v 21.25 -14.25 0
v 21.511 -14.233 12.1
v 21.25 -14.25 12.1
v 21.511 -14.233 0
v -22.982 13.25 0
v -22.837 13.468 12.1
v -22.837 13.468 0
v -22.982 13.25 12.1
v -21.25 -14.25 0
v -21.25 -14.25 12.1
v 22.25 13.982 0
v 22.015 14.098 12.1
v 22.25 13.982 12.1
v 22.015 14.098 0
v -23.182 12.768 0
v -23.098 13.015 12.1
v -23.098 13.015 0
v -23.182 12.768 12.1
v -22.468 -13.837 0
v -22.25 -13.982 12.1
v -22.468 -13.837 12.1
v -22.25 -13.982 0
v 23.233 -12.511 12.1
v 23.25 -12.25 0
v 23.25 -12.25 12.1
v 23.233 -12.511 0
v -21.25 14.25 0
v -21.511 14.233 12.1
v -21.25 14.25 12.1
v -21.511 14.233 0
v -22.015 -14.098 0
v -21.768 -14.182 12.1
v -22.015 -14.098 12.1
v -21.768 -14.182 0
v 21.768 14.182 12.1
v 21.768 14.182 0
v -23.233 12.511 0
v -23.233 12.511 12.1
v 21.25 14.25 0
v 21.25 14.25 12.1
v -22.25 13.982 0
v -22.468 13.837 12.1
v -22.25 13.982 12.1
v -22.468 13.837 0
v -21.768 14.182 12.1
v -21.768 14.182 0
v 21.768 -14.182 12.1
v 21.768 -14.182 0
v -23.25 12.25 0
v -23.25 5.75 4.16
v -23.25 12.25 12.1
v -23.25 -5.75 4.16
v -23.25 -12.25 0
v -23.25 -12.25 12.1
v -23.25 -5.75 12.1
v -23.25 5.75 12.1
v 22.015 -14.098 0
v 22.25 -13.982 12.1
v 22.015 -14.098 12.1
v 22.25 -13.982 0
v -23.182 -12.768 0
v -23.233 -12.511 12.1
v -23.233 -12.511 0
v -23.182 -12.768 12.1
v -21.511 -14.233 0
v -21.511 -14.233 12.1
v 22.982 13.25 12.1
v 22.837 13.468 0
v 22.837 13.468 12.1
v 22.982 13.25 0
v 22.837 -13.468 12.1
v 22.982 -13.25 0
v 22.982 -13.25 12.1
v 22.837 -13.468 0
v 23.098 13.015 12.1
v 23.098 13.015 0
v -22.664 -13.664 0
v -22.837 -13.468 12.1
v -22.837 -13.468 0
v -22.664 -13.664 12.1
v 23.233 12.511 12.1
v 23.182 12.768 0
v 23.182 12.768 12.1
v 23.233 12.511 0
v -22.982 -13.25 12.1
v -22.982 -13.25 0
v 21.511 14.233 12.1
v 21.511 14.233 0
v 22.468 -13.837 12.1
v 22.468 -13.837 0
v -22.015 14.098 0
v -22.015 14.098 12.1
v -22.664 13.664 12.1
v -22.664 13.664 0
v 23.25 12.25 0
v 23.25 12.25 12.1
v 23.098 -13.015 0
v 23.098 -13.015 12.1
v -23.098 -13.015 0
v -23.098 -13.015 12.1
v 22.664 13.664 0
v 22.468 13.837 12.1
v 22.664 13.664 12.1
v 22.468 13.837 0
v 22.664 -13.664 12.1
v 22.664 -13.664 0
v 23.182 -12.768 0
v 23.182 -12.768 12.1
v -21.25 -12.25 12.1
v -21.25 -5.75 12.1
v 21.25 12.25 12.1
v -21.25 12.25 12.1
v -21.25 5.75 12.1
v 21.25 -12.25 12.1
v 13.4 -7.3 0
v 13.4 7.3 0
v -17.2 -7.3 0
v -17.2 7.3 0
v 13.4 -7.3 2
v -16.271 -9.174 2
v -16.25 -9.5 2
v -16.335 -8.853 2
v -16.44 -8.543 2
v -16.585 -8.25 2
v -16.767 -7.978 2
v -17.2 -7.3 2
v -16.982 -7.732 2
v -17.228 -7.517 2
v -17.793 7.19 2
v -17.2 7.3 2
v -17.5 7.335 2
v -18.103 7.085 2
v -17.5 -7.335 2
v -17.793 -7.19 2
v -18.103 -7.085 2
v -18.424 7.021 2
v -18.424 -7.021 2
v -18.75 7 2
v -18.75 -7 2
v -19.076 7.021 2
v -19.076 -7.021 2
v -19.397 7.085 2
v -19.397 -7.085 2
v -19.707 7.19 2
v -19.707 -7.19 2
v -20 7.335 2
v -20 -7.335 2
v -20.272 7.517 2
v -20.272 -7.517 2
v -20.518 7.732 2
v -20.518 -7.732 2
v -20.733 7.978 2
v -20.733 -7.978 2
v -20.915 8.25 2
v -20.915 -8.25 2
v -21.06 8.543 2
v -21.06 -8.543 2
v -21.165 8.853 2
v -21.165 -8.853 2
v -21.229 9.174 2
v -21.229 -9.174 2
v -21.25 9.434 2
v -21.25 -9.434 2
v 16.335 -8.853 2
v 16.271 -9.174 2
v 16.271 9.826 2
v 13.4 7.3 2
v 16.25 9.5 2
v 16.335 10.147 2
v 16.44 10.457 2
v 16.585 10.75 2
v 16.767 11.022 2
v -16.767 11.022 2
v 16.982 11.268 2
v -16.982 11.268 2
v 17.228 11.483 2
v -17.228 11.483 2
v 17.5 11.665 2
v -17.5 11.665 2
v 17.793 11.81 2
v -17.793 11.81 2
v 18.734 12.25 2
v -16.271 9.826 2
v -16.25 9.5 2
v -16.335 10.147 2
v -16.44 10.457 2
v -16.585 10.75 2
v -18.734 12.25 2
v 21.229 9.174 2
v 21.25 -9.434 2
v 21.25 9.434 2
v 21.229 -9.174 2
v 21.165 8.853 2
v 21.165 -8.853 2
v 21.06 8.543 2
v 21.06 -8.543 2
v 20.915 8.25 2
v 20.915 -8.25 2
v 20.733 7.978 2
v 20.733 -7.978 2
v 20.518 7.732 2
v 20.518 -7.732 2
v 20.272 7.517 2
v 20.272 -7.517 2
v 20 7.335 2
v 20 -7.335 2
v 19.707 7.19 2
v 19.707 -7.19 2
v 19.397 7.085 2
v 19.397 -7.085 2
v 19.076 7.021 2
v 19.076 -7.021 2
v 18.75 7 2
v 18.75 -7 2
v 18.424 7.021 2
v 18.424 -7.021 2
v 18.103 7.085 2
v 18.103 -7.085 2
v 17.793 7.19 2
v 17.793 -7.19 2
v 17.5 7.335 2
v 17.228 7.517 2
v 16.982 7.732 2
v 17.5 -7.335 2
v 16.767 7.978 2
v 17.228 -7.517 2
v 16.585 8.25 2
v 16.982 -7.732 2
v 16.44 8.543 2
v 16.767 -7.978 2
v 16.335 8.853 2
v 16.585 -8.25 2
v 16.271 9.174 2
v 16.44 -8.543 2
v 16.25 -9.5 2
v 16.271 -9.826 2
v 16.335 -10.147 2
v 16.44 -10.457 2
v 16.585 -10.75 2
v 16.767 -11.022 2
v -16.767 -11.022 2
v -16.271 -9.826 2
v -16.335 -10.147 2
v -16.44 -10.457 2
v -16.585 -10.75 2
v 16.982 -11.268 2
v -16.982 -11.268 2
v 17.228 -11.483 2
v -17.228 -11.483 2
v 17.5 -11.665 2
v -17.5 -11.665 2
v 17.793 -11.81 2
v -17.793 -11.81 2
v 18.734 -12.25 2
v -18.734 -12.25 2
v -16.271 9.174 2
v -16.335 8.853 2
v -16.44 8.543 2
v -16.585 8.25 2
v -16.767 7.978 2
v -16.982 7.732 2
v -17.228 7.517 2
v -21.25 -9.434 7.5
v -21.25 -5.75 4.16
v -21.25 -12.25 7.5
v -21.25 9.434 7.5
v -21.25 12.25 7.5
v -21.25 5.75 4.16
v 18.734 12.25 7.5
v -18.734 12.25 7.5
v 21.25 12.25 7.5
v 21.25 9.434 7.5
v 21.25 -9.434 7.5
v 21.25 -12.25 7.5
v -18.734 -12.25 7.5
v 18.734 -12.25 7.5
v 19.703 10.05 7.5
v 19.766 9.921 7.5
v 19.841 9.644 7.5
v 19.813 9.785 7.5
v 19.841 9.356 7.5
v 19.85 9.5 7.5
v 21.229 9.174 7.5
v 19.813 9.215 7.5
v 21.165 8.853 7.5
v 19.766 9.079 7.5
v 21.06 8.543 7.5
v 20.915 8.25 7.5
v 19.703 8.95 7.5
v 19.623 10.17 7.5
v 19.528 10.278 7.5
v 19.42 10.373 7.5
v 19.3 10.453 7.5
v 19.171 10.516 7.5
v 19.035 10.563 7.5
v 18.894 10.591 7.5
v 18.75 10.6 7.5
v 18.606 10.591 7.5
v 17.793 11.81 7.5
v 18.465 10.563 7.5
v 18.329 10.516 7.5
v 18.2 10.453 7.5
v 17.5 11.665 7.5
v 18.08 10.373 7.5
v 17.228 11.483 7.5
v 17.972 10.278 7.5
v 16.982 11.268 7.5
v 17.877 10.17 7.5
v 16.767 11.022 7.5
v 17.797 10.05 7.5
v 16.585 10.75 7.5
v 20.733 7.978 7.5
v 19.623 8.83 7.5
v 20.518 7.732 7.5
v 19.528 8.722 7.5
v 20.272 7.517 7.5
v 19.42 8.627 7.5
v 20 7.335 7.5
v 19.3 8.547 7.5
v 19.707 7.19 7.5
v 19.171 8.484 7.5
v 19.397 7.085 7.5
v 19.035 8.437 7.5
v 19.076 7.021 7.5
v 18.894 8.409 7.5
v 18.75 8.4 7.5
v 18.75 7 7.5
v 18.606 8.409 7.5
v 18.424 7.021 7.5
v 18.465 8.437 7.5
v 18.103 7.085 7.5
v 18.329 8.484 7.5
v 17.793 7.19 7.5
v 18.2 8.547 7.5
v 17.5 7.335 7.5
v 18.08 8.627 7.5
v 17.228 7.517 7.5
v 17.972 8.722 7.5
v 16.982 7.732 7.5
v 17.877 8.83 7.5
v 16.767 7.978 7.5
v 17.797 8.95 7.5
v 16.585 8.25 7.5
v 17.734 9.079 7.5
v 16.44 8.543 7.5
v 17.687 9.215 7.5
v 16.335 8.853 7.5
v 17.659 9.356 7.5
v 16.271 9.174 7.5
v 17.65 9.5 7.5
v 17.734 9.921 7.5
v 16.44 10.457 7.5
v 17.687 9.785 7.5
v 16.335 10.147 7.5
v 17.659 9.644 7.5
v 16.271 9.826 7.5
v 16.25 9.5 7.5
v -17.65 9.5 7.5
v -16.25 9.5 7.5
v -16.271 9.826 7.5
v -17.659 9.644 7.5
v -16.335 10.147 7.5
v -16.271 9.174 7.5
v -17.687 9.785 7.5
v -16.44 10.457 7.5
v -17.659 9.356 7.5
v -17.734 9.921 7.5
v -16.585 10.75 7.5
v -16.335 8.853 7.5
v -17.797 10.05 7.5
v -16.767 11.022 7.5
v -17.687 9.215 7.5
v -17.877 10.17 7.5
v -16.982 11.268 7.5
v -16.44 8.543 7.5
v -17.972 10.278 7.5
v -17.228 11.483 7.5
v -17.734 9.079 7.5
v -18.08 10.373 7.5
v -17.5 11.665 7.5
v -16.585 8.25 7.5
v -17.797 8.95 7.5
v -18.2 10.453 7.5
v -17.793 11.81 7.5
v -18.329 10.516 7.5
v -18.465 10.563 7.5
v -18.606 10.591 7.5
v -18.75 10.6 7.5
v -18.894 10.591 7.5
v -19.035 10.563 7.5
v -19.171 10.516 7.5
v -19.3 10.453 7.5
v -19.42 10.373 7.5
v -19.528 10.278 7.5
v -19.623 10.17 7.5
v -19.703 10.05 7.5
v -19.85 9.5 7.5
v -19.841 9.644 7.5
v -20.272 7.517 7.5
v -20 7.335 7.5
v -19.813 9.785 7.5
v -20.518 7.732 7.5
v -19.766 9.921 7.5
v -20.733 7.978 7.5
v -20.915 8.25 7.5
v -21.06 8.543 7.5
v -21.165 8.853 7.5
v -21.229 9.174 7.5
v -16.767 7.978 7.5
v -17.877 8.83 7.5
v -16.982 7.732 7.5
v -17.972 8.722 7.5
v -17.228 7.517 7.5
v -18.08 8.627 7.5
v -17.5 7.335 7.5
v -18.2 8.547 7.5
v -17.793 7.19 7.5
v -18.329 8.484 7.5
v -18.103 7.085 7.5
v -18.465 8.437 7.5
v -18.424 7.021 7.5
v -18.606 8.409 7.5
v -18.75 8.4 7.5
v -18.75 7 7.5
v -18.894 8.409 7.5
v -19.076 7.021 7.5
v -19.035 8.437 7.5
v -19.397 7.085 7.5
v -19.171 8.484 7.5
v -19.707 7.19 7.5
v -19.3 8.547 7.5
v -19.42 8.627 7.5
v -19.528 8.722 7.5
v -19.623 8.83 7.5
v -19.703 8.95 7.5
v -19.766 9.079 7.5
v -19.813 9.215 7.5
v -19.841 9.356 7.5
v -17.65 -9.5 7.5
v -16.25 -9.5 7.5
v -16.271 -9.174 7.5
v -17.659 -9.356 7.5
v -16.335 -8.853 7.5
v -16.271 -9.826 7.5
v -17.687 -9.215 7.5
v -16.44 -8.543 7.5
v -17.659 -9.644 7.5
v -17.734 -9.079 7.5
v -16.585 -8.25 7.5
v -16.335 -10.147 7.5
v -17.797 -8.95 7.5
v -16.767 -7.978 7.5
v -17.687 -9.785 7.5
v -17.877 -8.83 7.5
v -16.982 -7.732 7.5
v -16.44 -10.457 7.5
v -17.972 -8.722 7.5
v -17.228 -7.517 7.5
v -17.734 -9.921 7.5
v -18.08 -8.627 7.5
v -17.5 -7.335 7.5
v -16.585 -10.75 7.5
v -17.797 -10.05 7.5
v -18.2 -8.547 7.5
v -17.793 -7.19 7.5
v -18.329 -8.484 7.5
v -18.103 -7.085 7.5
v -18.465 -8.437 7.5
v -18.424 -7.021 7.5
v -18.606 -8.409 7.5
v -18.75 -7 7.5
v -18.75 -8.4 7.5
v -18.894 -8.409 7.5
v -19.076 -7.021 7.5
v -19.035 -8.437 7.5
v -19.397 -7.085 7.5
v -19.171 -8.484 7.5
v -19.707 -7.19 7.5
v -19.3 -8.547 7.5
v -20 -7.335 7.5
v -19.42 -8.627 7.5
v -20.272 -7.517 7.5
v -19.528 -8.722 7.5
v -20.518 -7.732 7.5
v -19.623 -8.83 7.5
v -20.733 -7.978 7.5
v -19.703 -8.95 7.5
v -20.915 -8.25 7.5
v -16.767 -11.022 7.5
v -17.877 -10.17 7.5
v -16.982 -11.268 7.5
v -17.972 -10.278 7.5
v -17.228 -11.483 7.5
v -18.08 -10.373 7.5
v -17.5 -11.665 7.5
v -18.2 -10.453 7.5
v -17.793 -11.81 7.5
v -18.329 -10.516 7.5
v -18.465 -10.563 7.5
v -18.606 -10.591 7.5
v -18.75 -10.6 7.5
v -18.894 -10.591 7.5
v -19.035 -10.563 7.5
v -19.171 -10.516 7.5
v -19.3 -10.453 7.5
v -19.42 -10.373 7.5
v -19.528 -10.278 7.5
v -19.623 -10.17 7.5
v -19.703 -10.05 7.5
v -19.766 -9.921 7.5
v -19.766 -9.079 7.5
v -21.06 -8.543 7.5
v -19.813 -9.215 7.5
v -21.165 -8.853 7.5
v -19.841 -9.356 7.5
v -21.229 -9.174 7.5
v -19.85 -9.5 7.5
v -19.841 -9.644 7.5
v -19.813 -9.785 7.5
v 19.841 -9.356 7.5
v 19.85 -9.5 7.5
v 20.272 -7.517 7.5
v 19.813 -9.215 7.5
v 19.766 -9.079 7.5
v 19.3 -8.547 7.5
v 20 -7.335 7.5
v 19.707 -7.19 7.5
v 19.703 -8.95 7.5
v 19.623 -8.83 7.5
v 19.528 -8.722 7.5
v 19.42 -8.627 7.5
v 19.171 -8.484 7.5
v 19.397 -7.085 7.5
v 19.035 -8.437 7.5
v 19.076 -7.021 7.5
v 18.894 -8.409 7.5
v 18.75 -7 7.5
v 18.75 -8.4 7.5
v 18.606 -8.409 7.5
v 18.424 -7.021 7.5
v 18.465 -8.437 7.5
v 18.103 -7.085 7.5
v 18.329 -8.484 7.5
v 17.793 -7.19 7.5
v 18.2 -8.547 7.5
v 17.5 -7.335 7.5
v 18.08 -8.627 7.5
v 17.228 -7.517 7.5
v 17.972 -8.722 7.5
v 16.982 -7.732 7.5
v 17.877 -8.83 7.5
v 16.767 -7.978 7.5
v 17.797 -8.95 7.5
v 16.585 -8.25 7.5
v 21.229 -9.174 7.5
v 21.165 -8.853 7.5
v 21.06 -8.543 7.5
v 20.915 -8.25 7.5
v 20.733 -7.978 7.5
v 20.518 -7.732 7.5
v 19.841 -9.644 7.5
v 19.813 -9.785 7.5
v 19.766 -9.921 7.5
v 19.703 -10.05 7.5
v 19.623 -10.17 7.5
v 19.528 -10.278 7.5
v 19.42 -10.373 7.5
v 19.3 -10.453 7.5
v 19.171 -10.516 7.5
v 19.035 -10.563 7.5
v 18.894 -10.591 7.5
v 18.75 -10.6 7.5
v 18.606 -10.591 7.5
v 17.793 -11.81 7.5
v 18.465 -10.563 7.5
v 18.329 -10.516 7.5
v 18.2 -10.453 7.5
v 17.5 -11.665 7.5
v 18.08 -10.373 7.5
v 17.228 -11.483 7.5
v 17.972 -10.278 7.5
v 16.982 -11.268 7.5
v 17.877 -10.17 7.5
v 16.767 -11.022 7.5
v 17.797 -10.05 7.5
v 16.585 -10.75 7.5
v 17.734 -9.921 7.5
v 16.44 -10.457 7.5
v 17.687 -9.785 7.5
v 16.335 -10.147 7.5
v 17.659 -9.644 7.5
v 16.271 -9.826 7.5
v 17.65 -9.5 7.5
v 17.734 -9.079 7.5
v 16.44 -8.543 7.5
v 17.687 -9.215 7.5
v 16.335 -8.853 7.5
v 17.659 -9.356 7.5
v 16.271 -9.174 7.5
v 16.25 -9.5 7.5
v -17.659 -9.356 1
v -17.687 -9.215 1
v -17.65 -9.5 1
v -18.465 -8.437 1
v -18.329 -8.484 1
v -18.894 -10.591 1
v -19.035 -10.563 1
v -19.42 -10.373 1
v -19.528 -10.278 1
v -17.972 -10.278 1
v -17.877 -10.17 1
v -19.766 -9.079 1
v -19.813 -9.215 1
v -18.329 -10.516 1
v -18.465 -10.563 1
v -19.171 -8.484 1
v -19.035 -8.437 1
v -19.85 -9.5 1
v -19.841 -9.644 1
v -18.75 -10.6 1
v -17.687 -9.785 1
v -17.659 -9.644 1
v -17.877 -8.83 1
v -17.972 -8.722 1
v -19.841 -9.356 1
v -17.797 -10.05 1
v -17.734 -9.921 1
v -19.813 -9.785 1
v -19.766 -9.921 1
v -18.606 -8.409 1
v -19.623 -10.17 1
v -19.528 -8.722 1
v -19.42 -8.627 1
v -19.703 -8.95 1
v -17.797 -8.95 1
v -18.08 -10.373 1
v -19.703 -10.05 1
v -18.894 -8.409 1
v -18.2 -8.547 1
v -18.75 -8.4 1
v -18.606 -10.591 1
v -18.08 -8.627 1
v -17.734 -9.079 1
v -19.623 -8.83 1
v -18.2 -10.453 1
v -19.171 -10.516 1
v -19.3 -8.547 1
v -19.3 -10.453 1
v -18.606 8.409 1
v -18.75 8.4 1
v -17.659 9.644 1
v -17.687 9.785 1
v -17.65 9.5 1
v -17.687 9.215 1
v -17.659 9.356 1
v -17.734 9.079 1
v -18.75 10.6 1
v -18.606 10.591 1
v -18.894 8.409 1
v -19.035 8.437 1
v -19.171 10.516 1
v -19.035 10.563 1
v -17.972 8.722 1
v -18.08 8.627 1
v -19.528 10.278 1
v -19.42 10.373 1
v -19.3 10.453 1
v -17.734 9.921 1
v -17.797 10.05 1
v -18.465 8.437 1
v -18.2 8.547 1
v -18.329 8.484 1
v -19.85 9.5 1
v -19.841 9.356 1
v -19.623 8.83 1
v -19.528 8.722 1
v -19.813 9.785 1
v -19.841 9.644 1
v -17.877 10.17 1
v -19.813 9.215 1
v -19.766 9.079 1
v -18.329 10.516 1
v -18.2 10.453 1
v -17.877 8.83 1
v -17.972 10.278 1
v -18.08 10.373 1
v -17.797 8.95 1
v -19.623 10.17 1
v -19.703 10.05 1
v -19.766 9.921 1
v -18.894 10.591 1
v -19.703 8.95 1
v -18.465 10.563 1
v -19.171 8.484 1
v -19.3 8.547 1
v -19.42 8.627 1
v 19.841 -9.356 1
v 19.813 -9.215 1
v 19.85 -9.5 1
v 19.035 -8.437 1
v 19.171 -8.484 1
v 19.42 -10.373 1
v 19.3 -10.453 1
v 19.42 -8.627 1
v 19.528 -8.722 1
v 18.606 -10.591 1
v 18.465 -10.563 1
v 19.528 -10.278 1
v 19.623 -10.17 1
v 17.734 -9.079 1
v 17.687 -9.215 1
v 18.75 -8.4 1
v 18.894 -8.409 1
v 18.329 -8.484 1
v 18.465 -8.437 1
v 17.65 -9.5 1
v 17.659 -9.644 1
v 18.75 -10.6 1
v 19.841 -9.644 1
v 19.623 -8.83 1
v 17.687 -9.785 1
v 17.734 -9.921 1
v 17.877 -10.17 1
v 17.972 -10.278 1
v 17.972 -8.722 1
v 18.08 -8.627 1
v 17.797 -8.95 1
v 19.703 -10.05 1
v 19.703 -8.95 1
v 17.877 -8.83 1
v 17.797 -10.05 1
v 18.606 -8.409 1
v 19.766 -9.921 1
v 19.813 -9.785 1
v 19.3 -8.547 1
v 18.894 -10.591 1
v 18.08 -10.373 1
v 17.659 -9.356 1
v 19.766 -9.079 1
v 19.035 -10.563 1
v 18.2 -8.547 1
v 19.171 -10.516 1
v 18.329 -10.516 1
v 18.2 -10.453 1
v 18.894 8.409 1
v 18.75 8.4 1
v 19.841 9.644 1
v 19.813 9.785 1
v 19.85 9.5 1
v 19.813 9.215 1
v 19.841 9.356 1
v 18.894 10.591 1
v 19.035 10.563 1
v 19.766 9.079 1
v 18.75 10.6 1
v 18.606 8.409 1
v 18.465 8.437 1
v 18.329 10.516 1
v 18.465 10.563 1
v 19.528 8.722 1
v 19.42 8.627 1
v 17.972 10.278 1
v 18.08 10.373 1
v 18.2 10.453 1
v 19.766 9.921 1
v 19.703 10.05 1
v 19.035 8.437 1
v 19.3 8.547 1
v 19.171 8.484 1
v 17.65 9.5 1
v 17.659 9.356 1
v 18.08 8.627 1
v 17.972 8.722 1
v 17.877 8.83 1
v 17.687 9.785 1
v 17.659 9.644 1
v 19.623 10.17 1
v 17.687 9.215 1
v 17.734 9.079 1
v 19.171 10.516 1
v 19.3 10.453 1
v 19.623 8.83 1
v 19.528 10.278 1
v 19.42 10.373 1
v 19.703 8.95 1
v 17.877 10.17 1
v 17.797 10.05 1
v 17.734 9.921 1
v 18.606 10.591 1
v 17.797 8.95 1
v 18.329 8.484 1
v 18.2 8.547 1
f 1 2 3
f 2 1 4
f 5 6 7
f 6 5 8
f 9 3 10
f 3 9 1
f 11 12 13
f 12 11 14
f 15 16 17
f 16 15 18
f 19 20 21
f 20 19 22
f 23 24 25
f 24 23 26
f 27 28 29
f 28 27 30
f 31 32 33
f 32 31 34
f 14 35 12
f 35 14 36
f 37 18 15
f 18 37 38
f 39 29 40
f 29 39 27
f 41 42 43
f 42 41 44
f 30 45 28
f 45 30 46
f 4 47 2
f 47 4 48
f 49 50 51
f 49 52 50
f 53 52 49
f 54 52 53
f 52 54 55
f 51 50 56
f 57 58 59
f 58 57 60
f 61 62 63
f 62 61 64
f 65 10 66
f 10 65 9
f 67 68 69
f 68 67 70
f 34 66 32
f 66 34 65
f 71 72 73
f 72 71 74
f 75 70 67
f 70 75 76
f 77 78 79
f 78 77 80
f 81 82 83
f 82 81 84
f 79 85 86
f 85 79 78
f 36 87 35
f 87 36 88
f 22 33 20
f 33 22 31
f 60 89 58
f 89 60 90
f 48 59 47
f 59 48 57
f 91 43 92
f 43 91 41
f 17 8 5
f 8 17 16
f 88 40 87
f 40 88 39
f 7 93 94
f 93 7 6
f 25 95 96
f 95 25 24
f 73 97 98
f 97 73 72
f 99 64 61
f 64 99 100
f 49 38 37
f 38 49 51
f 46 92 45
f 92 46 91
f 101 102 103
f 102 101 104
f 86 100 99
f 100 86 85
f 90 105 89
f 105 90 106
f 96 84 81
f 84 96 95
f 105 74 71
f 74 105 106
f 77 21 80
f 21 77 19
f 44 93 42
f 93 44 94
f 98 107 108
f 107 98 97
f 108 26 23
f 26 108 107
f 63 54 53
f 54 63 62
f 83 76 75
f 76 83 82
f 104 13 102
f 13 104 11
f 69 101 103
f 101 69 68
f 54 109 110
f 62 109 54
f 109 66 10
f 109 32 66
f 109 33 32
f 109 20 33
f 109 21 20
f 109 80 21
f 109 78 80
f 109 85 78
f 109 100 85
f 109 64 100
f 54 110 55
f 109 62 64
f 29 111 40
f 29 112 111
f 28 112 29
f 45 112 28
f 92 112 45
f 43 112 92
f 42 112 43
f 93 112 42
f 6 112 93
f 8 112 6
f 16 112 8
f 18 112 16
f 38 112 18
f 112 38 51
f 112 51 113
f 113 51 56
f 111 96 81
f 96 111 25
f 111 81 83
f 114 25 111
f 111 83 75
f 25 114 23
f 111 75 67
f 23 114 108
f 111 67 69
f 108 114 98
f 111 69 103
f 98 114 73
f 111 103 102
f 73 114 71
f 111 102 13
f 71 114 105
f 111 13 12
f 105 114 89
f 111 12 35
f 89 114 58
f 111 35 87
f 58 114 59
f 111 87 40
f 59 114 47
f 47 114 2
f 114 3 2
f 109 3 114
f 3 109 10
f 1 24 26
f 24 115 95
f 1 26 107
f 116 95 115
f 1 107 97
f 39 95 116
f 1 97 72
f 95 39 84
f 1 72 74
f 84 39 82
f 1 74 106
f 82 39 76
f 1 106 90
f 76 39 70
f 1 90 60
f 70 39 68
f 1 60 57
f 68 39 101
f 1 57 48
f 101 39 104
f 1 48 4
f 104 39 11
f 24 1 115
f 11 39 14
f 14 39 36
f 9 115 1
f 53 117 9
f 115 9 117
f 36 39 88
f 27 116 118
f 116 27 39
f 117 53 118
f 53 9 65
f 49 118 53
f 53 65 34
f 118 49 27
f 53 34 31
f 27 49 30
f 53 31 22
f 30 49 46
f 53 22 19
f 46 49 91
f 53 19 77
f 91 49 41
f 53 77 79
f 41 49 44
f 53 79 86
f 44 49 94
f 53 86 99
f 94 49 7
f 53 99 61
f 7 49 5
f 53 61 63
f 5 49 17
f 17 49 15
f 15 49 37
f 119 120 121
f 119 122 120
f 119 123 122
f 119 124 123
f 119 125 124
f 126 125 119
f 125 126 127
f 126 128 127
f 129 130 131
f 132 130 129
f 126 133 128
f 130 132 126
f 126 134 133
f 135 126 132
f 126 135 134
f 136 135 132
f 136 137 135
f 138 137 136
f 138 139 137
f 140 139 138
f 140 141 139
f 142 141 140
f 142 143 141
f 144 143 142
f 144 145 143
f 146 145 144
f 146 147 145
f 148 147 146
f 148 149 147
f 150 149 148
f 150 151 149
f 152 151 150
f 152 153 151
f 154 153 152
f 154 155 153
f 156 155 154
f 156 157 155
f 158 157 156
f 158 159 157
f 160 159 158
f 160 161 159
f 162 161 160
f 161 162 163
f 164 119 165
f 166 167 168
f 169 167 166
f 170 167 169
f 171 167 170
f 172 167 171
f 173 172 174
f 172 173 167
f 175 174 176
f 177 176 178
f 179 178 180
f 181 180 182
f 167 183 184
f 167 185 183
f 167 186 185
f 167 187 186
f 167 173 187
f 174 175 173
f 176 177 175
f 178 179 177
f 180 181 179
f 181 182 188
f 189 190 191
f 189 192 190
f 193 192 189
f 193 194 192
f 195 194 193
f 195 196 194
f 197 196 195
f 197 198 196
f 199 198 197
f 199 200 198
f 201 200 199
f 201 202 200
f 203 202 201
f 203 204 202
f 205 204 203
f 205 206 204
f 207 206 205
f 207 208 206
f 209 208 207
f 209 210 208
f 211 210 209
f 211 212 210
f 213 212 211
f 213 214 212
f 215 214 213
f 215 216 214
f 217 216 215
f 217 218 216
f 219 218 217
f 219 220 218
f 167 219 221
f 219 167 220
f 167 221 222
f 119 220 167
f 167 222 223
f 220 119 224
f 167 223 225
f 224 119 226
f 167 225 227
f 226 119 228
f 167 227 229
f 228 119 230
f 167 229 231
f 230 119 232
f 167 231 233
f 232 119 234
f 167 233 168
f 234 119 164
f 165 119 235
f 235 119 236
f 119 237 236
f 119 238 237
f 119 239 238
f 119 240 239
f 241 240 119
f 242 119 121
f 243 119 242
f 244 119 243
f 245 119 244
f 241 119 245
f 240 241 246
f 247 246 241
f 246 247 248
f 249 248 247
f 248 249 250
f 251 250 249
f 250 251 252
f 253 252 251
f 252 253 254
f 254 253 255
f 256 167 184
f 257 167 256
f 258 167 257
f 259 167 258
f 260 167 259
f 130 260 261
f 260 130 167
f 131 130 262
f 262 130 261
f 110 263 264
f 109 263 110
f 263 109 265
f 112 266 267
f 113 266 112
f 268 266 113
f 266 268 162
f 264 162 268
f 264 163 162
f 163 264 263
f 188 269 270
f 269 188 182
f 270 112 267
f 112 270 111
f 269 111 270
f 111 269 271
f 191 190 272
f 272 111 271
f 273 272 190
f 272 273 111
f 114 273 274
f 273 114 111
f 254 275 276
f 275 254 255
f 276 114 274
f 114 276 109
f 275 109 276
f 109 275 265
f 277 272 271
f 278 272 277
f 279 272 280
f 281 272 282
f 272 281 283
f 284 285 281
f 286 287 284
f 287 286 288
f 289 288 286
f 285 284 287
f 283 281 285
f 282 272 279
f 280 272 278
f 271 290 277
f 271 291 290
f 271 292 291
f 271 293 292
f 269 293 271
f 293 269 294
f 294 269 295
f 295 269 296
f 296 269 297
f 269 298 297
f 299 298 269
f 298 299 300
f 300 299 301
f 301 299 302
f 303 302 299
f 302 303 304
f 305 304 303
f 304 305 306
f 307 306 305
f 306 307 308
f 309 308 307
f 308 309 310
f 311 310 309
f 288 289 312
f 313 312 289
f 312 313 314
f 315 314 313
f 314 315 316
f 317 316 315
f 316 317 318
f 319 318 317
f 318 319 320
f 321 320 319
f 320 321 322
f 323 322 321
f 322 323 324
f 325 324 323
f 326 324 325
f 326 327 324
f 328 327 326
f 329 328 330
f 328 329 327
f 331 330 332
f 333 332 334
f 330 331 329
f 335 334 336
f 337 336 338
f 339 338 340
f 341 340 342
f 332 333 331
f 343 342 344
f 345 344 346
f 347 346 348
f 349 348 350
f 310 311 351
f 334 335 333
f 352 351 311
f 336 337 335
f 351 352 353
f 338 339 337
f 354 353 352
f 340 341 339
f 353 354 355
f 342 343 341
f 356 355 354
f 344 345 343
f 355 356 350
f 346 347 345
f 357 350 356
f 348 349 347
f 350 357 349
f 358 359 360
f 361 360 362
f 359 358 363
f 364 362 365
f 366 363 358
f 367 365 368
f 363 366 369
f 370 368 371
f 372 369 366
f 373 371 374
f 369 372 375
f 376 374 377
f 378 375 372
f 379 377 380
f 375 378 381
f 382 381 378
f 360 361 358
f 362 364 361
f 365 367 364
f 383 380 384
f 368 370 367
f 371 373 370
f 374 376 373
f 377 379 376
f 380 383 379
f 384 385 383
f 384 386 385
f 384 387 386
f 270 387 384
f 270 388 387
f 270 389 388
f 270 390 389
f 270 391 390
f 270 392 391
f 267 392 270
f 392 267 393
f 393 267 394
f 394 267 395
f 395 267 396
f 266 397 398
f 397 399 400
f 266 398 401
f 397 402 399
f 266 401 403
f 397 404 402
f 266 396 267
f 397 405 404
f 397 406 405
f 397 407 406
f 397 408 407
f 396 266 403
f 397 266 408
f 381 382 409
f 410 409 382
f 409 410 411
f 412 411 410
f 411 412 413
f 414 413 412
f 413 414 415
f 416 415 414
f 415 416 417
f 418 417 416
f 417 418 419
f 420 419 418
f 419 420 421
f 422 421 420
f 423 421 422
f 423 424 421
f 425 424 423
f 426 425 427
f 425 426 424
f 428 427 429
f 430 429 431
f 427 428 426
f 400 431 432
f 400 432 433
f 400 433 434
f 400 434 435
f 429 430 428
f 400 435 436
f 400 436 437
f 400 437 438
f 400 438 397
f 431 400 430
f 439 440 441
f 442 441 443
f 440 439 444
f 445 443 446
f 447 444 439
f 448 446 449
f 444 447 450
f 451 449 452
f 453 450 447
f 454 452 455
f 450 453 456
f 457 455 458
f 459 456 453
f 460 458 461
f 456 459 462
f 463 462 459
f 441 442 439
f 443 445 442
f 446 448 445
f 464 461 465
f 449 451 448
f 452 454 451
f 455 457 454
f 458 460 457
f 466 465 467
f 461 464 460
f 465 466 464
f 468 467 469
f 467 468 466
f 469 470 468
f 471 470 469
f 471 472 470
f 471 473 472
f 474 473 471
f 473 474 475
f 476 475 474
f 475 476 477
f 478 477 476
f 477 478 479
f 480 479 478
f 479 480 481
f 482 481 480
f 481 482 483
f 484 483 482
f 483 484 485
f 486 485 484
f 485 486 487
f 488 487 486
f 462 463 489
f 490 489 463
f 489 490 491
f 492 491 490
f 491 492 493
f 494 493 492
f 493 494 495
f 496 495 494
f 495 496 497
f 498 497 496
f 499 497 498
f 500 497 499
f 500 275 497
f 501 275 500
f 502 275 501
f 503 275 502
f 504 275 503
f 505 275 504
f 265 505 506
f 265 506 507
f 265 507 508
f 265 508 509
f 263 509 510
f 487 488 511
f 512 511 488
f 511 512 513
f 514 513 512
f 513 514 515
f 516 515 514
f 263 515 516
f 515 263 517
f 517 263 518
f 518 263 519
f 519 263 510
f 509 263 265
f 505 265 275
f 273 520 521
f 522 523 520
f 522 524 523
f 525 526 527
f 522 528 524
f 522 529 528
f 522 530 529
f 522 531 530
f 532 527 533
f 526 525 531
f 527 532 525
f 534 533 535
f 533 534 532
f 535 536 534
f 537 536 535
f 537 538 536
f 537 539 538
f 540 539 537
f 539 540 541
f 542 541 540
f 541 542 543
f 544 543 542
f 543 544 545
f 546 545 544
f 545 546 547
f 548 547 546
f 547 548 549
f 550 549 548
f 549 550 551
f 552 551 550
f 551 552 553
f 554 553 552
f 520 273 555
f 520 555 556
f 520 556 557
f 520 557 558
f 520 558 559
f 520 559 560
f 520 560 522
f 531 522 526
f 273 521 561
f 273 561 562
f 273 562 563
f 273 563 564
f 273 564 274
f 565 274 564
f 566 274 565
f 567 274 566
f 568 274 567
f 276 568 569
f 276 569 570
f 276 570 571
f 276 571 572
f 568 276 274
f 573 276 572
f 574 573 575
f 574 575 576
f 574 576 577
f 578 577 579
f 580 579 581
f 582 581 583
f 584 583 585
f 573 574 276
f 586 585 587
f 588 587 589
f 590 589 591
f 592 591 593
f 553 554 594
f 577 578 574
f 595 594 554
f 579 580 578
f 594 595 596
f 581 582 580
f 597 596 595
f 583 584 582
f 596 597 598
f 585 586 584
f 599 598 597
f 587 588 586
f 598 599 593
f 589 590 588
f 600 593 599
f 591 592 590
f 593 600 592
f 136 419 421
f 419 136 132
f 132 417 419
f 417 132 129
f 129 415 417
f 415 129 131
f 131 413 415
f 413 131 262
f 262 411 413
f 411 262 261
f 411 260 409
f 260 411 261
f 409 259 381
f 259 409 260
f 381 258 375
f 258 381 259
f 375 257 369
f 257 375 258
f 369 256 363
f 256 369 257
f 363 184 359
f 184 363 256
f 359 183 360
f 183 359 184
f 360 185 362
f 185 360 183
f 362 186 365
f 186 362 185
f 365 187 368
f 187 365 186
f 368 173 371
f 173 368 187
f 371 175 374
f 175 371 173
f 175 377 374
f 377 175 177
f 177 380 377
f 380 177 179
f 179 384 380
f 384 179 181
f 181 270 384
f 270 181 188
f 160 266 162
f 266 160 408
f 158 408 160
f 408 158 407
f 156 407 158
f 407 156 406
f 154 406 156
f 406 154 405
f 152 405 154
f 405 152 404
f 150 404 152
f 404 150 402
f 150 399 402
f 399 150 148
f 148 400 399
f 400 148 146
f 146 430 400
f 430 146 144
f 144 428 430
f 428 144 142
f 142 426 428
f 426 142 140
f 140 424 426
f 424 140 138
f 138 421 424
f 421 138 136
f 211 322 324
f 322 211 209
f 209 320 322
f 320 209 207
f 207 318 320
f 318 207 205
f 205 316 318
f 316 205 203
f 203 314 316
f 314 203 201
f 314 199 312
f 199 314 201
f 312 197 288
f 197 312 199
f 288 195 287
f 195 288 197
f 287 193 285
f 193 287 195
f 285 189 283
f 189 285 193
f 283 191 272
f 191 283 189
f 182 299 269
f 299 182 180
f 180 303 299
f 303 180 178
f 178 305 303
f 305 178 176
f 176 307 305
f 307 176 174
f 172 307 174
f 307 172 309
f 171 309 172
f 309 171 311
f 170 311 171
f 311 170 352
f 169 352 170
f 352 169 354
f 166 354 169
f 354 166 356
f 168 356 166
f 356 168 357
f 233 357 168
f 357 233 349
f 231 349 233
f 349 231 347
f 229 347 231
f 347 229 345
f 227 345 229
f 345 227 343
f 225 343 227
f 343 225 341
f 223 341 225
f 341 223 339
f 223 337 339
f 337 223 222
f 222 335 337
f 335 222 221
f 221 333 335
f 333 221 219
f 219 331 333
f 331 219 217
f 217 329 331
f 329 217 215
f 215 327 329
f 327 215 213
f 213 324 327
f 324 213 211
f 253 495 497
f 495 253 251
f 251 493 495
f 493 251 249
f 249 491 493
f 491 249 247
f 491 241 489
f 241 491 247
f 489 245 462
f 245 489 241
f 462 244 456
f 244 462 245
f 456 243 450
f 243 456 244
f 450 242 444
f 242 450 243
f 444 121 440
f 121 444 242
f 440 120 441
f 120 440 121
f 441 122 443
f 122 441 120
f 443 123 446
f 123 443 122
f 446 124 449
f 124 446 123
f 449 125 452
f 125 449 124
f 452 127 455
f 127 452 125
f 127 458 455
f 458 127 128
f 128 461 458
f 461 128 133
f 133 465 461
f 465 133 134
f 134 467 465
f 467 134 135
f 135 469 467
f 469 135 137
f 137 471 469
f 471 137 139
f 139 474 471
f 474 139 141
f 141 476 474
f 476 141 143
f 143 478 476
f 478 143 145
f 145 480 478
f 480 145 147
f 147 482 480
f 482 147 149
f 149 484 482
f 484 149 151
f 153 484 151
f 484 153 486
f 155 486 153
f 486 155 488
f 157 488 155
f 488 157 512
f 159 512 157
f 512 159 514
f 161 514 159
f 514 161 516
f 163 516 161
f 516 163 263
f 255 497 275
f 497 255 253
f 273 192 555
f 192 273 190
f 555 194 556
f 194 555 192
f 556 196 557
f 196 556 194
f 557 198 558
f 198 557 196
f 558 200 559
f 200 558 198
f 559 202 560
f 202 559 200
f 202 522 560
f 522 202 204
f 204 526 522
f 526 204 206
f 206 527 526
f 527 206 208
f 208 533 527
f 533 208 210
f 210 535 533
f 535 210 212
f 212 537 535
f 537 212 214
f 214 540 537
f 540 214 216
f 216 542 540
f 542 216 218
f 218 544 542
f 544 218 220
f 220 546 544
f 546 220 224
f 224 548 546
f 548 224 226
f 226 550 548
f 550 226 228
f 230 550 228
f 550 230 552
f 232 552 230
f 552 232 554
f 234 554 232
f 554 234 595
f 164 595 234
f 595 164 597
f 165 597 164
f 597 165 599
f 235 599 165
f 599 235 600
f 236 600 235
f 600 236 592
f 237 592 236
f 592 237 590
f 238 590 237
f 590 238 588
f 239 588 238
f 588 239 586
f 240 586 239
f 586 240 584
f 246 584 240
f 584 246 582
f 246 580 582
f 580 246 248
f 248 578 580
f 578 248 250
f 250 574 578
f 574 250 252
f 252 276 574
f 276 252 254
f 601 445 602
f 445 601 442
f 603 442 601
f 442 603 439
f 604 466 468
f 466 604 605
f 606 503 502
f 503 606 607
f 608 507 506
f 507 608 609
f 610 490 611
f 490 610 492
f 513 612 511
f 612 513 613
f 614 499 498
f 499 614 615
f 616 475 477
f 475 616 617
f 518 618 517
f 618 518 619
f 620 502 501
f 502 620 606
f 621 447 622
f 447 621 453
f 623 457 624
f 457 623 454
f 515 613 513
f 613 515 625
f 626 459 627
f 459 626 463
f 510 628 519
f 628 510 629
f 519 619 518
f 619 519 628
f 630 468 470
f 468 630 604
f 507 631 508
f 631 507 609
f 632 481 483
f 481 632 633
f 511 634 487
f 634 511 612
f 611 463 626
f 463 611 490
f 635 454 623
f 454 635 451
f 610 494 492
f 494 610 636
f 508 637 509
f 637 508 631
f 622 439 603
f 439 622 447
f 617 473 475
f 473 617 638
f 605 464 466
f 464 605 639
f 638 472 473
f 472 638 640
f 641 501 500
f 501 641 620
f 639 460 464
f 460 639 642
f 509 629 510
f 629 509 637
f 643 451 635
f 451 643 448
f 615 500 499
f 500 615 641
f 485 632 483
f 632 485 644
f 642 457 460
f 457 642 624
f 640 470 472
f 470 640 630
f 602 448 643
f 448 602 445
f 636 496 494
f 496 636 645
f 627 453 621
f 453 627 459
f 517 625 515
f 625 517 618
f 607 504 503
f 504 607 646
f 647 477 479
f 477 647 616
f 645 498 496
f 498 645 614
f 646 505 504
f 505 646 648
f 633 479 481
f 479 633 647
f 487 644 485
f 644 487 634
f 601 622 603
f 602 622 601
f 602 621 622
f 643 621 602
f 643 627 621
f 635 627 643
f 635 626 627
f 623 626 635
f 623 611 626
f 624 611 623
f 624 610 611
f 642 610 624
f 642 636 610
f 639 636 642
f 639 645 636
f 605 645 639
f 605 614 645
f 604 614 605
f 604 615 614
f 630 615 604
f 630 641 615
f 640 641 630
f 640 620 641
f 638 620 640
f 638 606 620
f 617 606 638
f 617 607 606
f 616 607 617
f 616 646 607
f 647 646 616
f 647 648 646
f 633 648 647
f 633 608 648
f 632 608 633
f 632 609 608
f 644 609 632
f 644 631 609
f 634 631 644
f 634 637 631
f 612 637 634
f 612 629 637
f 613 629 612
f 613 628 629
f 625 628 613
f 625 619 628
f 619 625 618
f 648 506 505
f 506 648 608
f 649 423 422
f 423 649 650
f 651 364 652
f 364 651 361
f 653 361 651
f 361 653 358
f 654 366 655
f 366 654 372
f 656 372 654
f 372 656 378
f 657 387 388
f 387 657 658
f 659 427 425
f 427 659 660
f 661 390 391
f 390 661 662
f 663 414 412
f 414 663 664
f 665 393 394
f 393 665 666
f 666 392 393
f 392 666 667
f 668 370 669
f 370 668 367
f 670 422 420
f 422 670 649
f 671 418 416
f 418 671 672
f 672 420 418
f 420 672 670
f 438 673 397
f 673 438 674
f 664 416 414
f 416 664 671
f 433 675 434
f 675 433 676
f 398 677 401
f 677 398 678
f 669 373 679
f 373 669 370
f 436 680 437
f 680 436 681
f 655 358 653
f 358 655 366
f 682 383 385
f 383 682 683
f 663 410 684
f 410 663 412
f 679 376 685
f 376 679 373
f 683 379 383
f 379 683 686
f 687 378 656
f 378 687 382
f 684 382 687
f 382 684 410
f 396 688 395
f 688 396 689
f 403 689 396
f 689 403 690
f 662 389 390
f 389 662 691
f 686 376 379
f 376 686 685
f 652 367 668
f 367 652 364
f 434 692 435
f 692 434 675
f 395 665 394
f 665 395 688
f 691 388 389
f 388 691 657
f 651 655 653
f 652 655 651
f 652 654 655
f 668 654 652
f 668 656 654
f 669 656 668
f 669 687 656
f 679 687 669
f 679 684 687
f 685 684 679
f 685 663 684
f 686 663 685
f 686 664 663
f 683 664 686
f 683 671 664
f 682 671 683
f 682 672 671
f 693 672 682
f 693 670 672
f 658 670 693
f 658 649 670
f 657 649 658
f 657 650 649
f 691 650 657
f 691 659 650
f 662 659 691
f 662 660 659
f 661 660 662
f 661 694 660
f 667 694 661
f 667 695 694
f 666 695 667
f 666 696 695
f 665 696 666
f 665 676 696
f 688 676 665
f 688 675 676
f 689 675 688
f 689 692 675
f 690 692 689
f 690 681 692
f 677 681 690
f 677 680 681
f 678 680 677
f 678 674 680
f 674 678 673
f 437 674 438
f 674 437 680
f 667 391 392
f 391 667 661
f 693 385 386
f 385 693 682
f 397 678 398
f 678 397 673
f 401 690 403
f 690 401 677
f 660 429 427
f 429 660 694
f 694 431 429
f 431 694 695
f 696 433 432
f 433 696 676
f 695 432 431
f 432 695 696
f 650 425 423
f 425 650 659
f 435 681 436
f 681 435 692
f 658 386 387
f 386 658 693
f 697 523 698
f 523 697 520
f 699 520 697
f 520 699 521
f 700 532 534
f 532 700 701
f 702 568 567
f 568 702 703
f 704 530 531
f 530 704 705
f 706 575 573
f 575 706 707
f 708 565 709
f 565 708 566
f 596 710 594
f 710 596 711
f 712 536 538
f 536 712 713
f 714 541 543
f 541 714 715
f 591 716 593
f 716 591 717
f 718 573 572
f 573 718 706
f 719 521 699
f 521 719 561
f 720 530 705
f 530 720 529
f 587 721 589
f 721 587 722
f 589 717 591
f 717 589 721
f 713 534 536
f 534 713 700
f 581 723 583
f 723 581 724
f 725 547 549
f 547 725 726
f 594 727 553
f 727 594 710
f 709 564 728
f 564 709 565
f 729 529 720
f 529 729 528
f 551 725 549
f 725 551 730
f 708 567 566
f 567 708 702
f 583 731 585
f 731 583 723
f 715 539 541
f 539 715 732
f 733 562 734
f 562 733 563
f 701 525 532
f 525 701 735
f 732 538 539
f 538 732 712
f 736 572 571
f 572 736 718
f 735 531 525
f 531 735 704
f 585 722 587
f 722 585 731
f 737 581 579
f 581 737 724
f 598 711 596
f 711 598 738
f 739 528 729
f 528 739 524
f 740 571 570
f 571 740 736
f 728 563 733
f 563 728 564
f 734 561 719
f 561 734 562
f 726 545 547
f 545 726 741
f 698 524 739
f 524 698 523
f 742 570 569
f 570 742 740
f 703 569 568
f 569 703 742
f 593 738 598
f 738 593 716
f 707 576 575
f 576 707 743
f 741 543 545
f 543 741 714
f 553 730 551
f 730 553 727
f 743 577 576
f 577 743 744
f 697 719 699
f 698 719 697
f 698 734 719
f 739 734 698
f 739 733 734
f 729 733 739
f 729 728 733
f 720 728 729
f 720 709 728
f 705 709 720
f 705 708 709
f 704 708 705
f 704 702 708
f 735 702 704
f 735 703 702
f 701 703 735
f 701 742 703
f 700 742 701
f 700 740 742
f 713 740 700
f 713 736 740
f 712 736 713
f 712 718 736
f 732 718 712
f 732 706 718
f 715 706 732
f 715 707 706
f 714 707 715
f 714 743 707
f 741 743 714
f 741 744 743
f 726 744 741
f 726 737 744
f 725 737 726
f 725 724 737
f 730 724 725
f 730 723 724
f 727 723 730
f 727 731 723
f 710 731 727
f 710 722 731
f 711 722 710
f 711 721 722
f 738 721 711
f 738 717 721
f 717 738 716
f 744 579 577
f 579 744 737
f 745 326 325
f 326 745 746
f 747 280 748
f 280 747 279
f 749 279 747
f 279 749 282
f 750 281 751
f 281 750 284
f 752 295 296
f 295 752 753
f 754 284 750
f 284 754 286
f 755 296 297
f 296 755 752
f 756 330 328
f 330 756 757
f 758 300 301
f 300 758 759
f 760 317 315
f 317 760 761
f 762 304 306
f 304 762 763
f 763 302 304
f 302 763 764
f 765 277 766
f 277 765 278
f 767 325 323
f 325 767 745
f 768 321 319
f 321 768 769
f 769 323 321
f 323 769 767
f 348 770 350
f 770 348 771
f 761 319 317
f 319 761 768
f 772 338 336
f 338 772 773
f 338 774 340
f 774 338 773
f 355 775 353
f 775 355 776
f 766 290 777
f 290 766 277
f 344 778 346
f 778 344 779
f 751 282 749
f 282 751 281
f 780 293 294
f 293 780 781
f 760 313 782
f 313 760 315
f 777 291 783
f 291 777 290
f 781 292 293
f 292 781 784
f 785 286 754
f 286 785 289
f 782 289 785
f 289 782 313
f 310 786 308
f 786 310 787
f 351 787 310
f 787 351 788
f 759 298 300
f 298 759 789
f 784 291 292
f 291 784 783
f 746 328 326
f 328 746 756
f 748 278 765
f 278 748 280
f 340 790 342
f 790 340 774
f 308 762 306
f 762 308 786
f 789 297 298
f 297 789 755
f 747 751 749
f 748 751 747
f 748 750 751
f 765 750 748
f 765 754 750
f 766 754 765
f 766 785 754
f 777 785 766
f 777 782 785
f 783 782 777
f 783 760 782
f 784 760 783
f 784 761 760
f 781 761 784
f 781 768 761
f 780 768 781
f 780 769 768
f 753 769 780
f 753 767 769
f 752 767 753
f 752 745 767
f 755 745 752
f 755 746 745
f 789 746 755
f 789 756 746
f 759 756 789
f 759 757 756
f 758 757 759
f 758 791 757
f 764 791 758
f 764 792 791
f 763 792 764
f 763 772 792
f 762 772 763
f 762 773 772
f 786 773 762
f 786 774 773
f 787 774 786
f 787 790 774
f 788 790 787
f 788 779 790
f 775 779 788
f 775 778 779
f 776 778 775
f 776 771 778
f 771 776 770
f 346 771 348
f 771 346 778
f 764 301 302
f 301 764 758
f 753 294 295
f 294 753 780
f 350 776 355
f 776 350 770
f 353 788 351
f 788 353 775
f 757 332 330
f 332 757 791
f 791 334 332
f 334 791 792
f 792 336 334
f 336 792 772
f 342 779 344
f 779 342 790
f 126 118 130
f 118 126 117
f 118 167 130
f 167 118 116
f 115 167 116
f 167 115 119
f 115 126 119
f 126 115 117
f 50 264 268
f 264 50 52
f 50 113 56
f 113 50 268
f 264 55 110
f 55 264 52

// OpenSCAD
// Small enclosure for the TM1637 4-digit segment display module.
// Two prints. The shell prints face down: its outer front face is z = 0, the
// display looks out through a window, and the board's front rests on four posts
// fused into the corners. The module's right-angle header is on the board's
// front at the -X end, pins pointing out along -X; a Dupont plug pushes onto
// them through a window in the -X end wall. The back cover (part-back.scad)
// closes the box: a tongue fills the end-wall notch above the plug, four tubes
// press on the board's flat back, and four M2.5 x 12 self-tappers go
// cover -> tube -> board -> post.

/* [Board] (calipers, owner) */
board_l = 41.5;
board_w = 23.5;
board_t = 1.6;       // guessed, standard PCB
hole_dx = 37.5;      // centre to centre, long side
hole_dy = 19;        // centre to centre, short side
hole_d = 2.8;

/* [Display] (calipers, owner; offset from the photo) */
disp_l = 30;
disp_w = 14;
disp_h = 7;          // display face above the board's front
disp_dx = -1.9;      // toward the header end; photo estimate, caliper it
disp_dy = 0;
disp_recess = 0.5;   // display face sits this far behind the shell's outer face
window_clear = 0.3;  // per side around the display body

/* [Header] (photo; caliper it) */
hdr_w = 10.2;        // 4 pins x 2.54
plug_h = 2.54;       // Dupont housing, square
plug_clear = 0.4;    // per side around the plug

/* [Shell] */
wall = 2;
face_t = 2;
board_clear = 0.5;   // per side, board edge to inner wall
corner_r = 2;
post_d = 5;
pilot_d = 2.2;       // M2.5 self-tapping into plastic, calibration pending
rear_clear = 3;      // board back to cover: solder joints only

/* [Back cover] */
cover_t = 2.5;
lip_h = 2;
lip_t = 1.2;
lip_clear = 0.25;    // per side, guessed, unmeasured fit
tube_d = 4.8;
screw_clear_d = 2.9;

part = "shell";      // shell | back | assembly

/* [Hidden] */
$fn = 48;
in_l = board_l + 2*board_clear;
in_w = board_w + 2*board_clear;
out_l = in_l + 2*wall;
out_w = in_w + 2*wall;
board_z = disp_recess + disp_h;            // board front face
shell_h = board_z + board_t + rear_clear;  // rim
holes = [for (sx = [-1, 1], sy = [-1, 1]) [sx*hole_dx/2, sy*hole_dy/2]];
notch_w = hdr_w + 2*plug_clear + 0.5;
notch_z = board_z - plug_h - 2*plug_clear; // bottom of the plug window
tongue_clear = 0.2;

module rrect(l, w, r) { offset(r = r) square([l - 2*r, w - 2*r], center = true); }

// Keep-out for the display body inside the shell.
module disp_keepout() {
    translate([disp_dx, disp_dy, 0])
        square([disp_l + 2*window_clear, disp_w + 2*window_clear], center = true);
}

// Corner post: a round boss around the hole, filled out to the corner walls,
// clipped clear of the display body.
module posts_2d() {
    difference() {
        for (h = holes) hull() {
            translate(h) circle(d = post_d);
            translate([sign(h[0])*in_l/2, sign(h[1])*in_w/2]) square(0.01, center = true);
            translate([sign(h[0])*in_l/2, h[1]]) square(0.01, center = true);
            translate([h[0], sign(h[1])*in_w/2]) square(0.01, center = true);
        }
        disp_keepout();
    }
}

module shell() {
    difference() {
        union() {
            difference() {
                linear_extrude(shell_h) rrect(out_l, out_w, corner_r);
                translate([0, 0, face_t]) linear_extrude(shell_h) square([in_l, in_w], center = true);
            }
            linear_extrude(board_z) posts_2d();
        }
        translate([0, 0, -1]) linear_extrude(face_t + 2) disp_keepout();
        for (h = holes) translate([h[0], h[1], face_t - 1]) cylinder(d = pilot_d, h = board_z);
        // header end: open from the rim down to the bottom of the plug window
        translate([-out_l/2 - 1, -notch_w/2, notch_z]) cube([wall + 2, notch_w, shell_h]);
    }
}

// Back cover, modelled as printed: outer face on the bed, lip, tubes and tongue up.
module back() {
    tongue_h = shell_h - board_z;   // fills the notch from the rim down to the board's front
    difference() {
        union() {
            linear_extrude(cover_t) rrect(out_l, out_w, corner_r);
            translate([0, 0, cover_t]) linear_extrude(lip_h) difference() {
                square([in_l - 2*lip_clear, in_w - 2*lip_clear], center = true);
                square([in_l - 2*lip_clear - 2*lip_t, in_w - 2*lip_clear - 2*lip_t], center = true);
            }
            for (h = holes) translate([h[0], h[1], 0]) cylinder(d = tube_d, h = cover_t + rear_clear);
            // tongue sits in the -X end wall's notch
            translate([-out_l/2, -(notch_w/2 - tongue_clear), 0])
                cube([wall, notch_w - 2*tongue_clear, cover_t + tongue_h]);
        }
        for (h = holes) translate([h[0], h[1], -1]) cylinder(d = screw_clear_d, h = cover_t + rear_clear + 2);
    }
}

// Stand-ins for review renders only: board, display, header and plug.
module module_standin() {
    translate([0, 0, board_z]) linear_extrude(board_t) difference() {
        square([board_l, board_w], center = true);
        for (h = holes) translate(h) circle(d = hole_d);
    }
    translate([disp_dx, disp_dy, disp_recess]) linear_extrude(disp_h) square([disp_l, disp_w], center = true);
    translate([-board_l/2 - 6, -hdr_w/2, board_z - plug_h - 0.2]) cube([8, hdr_w, plug_h]);   // header + pins
    translate([-out_l/2 - 12, -hdr_w/2, board_z - plug_h - 0.2]) cube([14, hdr_w, plug_h]);   // Dupont plug
}

if (part == "shell") shell();
else if (part == "back") back();
else {
    shell();
    module_standin();
    translate([0, 0, shell_h + cover_t + 10]) mirror([0, 0, 1]) back();  // exploded 10 mm
}
